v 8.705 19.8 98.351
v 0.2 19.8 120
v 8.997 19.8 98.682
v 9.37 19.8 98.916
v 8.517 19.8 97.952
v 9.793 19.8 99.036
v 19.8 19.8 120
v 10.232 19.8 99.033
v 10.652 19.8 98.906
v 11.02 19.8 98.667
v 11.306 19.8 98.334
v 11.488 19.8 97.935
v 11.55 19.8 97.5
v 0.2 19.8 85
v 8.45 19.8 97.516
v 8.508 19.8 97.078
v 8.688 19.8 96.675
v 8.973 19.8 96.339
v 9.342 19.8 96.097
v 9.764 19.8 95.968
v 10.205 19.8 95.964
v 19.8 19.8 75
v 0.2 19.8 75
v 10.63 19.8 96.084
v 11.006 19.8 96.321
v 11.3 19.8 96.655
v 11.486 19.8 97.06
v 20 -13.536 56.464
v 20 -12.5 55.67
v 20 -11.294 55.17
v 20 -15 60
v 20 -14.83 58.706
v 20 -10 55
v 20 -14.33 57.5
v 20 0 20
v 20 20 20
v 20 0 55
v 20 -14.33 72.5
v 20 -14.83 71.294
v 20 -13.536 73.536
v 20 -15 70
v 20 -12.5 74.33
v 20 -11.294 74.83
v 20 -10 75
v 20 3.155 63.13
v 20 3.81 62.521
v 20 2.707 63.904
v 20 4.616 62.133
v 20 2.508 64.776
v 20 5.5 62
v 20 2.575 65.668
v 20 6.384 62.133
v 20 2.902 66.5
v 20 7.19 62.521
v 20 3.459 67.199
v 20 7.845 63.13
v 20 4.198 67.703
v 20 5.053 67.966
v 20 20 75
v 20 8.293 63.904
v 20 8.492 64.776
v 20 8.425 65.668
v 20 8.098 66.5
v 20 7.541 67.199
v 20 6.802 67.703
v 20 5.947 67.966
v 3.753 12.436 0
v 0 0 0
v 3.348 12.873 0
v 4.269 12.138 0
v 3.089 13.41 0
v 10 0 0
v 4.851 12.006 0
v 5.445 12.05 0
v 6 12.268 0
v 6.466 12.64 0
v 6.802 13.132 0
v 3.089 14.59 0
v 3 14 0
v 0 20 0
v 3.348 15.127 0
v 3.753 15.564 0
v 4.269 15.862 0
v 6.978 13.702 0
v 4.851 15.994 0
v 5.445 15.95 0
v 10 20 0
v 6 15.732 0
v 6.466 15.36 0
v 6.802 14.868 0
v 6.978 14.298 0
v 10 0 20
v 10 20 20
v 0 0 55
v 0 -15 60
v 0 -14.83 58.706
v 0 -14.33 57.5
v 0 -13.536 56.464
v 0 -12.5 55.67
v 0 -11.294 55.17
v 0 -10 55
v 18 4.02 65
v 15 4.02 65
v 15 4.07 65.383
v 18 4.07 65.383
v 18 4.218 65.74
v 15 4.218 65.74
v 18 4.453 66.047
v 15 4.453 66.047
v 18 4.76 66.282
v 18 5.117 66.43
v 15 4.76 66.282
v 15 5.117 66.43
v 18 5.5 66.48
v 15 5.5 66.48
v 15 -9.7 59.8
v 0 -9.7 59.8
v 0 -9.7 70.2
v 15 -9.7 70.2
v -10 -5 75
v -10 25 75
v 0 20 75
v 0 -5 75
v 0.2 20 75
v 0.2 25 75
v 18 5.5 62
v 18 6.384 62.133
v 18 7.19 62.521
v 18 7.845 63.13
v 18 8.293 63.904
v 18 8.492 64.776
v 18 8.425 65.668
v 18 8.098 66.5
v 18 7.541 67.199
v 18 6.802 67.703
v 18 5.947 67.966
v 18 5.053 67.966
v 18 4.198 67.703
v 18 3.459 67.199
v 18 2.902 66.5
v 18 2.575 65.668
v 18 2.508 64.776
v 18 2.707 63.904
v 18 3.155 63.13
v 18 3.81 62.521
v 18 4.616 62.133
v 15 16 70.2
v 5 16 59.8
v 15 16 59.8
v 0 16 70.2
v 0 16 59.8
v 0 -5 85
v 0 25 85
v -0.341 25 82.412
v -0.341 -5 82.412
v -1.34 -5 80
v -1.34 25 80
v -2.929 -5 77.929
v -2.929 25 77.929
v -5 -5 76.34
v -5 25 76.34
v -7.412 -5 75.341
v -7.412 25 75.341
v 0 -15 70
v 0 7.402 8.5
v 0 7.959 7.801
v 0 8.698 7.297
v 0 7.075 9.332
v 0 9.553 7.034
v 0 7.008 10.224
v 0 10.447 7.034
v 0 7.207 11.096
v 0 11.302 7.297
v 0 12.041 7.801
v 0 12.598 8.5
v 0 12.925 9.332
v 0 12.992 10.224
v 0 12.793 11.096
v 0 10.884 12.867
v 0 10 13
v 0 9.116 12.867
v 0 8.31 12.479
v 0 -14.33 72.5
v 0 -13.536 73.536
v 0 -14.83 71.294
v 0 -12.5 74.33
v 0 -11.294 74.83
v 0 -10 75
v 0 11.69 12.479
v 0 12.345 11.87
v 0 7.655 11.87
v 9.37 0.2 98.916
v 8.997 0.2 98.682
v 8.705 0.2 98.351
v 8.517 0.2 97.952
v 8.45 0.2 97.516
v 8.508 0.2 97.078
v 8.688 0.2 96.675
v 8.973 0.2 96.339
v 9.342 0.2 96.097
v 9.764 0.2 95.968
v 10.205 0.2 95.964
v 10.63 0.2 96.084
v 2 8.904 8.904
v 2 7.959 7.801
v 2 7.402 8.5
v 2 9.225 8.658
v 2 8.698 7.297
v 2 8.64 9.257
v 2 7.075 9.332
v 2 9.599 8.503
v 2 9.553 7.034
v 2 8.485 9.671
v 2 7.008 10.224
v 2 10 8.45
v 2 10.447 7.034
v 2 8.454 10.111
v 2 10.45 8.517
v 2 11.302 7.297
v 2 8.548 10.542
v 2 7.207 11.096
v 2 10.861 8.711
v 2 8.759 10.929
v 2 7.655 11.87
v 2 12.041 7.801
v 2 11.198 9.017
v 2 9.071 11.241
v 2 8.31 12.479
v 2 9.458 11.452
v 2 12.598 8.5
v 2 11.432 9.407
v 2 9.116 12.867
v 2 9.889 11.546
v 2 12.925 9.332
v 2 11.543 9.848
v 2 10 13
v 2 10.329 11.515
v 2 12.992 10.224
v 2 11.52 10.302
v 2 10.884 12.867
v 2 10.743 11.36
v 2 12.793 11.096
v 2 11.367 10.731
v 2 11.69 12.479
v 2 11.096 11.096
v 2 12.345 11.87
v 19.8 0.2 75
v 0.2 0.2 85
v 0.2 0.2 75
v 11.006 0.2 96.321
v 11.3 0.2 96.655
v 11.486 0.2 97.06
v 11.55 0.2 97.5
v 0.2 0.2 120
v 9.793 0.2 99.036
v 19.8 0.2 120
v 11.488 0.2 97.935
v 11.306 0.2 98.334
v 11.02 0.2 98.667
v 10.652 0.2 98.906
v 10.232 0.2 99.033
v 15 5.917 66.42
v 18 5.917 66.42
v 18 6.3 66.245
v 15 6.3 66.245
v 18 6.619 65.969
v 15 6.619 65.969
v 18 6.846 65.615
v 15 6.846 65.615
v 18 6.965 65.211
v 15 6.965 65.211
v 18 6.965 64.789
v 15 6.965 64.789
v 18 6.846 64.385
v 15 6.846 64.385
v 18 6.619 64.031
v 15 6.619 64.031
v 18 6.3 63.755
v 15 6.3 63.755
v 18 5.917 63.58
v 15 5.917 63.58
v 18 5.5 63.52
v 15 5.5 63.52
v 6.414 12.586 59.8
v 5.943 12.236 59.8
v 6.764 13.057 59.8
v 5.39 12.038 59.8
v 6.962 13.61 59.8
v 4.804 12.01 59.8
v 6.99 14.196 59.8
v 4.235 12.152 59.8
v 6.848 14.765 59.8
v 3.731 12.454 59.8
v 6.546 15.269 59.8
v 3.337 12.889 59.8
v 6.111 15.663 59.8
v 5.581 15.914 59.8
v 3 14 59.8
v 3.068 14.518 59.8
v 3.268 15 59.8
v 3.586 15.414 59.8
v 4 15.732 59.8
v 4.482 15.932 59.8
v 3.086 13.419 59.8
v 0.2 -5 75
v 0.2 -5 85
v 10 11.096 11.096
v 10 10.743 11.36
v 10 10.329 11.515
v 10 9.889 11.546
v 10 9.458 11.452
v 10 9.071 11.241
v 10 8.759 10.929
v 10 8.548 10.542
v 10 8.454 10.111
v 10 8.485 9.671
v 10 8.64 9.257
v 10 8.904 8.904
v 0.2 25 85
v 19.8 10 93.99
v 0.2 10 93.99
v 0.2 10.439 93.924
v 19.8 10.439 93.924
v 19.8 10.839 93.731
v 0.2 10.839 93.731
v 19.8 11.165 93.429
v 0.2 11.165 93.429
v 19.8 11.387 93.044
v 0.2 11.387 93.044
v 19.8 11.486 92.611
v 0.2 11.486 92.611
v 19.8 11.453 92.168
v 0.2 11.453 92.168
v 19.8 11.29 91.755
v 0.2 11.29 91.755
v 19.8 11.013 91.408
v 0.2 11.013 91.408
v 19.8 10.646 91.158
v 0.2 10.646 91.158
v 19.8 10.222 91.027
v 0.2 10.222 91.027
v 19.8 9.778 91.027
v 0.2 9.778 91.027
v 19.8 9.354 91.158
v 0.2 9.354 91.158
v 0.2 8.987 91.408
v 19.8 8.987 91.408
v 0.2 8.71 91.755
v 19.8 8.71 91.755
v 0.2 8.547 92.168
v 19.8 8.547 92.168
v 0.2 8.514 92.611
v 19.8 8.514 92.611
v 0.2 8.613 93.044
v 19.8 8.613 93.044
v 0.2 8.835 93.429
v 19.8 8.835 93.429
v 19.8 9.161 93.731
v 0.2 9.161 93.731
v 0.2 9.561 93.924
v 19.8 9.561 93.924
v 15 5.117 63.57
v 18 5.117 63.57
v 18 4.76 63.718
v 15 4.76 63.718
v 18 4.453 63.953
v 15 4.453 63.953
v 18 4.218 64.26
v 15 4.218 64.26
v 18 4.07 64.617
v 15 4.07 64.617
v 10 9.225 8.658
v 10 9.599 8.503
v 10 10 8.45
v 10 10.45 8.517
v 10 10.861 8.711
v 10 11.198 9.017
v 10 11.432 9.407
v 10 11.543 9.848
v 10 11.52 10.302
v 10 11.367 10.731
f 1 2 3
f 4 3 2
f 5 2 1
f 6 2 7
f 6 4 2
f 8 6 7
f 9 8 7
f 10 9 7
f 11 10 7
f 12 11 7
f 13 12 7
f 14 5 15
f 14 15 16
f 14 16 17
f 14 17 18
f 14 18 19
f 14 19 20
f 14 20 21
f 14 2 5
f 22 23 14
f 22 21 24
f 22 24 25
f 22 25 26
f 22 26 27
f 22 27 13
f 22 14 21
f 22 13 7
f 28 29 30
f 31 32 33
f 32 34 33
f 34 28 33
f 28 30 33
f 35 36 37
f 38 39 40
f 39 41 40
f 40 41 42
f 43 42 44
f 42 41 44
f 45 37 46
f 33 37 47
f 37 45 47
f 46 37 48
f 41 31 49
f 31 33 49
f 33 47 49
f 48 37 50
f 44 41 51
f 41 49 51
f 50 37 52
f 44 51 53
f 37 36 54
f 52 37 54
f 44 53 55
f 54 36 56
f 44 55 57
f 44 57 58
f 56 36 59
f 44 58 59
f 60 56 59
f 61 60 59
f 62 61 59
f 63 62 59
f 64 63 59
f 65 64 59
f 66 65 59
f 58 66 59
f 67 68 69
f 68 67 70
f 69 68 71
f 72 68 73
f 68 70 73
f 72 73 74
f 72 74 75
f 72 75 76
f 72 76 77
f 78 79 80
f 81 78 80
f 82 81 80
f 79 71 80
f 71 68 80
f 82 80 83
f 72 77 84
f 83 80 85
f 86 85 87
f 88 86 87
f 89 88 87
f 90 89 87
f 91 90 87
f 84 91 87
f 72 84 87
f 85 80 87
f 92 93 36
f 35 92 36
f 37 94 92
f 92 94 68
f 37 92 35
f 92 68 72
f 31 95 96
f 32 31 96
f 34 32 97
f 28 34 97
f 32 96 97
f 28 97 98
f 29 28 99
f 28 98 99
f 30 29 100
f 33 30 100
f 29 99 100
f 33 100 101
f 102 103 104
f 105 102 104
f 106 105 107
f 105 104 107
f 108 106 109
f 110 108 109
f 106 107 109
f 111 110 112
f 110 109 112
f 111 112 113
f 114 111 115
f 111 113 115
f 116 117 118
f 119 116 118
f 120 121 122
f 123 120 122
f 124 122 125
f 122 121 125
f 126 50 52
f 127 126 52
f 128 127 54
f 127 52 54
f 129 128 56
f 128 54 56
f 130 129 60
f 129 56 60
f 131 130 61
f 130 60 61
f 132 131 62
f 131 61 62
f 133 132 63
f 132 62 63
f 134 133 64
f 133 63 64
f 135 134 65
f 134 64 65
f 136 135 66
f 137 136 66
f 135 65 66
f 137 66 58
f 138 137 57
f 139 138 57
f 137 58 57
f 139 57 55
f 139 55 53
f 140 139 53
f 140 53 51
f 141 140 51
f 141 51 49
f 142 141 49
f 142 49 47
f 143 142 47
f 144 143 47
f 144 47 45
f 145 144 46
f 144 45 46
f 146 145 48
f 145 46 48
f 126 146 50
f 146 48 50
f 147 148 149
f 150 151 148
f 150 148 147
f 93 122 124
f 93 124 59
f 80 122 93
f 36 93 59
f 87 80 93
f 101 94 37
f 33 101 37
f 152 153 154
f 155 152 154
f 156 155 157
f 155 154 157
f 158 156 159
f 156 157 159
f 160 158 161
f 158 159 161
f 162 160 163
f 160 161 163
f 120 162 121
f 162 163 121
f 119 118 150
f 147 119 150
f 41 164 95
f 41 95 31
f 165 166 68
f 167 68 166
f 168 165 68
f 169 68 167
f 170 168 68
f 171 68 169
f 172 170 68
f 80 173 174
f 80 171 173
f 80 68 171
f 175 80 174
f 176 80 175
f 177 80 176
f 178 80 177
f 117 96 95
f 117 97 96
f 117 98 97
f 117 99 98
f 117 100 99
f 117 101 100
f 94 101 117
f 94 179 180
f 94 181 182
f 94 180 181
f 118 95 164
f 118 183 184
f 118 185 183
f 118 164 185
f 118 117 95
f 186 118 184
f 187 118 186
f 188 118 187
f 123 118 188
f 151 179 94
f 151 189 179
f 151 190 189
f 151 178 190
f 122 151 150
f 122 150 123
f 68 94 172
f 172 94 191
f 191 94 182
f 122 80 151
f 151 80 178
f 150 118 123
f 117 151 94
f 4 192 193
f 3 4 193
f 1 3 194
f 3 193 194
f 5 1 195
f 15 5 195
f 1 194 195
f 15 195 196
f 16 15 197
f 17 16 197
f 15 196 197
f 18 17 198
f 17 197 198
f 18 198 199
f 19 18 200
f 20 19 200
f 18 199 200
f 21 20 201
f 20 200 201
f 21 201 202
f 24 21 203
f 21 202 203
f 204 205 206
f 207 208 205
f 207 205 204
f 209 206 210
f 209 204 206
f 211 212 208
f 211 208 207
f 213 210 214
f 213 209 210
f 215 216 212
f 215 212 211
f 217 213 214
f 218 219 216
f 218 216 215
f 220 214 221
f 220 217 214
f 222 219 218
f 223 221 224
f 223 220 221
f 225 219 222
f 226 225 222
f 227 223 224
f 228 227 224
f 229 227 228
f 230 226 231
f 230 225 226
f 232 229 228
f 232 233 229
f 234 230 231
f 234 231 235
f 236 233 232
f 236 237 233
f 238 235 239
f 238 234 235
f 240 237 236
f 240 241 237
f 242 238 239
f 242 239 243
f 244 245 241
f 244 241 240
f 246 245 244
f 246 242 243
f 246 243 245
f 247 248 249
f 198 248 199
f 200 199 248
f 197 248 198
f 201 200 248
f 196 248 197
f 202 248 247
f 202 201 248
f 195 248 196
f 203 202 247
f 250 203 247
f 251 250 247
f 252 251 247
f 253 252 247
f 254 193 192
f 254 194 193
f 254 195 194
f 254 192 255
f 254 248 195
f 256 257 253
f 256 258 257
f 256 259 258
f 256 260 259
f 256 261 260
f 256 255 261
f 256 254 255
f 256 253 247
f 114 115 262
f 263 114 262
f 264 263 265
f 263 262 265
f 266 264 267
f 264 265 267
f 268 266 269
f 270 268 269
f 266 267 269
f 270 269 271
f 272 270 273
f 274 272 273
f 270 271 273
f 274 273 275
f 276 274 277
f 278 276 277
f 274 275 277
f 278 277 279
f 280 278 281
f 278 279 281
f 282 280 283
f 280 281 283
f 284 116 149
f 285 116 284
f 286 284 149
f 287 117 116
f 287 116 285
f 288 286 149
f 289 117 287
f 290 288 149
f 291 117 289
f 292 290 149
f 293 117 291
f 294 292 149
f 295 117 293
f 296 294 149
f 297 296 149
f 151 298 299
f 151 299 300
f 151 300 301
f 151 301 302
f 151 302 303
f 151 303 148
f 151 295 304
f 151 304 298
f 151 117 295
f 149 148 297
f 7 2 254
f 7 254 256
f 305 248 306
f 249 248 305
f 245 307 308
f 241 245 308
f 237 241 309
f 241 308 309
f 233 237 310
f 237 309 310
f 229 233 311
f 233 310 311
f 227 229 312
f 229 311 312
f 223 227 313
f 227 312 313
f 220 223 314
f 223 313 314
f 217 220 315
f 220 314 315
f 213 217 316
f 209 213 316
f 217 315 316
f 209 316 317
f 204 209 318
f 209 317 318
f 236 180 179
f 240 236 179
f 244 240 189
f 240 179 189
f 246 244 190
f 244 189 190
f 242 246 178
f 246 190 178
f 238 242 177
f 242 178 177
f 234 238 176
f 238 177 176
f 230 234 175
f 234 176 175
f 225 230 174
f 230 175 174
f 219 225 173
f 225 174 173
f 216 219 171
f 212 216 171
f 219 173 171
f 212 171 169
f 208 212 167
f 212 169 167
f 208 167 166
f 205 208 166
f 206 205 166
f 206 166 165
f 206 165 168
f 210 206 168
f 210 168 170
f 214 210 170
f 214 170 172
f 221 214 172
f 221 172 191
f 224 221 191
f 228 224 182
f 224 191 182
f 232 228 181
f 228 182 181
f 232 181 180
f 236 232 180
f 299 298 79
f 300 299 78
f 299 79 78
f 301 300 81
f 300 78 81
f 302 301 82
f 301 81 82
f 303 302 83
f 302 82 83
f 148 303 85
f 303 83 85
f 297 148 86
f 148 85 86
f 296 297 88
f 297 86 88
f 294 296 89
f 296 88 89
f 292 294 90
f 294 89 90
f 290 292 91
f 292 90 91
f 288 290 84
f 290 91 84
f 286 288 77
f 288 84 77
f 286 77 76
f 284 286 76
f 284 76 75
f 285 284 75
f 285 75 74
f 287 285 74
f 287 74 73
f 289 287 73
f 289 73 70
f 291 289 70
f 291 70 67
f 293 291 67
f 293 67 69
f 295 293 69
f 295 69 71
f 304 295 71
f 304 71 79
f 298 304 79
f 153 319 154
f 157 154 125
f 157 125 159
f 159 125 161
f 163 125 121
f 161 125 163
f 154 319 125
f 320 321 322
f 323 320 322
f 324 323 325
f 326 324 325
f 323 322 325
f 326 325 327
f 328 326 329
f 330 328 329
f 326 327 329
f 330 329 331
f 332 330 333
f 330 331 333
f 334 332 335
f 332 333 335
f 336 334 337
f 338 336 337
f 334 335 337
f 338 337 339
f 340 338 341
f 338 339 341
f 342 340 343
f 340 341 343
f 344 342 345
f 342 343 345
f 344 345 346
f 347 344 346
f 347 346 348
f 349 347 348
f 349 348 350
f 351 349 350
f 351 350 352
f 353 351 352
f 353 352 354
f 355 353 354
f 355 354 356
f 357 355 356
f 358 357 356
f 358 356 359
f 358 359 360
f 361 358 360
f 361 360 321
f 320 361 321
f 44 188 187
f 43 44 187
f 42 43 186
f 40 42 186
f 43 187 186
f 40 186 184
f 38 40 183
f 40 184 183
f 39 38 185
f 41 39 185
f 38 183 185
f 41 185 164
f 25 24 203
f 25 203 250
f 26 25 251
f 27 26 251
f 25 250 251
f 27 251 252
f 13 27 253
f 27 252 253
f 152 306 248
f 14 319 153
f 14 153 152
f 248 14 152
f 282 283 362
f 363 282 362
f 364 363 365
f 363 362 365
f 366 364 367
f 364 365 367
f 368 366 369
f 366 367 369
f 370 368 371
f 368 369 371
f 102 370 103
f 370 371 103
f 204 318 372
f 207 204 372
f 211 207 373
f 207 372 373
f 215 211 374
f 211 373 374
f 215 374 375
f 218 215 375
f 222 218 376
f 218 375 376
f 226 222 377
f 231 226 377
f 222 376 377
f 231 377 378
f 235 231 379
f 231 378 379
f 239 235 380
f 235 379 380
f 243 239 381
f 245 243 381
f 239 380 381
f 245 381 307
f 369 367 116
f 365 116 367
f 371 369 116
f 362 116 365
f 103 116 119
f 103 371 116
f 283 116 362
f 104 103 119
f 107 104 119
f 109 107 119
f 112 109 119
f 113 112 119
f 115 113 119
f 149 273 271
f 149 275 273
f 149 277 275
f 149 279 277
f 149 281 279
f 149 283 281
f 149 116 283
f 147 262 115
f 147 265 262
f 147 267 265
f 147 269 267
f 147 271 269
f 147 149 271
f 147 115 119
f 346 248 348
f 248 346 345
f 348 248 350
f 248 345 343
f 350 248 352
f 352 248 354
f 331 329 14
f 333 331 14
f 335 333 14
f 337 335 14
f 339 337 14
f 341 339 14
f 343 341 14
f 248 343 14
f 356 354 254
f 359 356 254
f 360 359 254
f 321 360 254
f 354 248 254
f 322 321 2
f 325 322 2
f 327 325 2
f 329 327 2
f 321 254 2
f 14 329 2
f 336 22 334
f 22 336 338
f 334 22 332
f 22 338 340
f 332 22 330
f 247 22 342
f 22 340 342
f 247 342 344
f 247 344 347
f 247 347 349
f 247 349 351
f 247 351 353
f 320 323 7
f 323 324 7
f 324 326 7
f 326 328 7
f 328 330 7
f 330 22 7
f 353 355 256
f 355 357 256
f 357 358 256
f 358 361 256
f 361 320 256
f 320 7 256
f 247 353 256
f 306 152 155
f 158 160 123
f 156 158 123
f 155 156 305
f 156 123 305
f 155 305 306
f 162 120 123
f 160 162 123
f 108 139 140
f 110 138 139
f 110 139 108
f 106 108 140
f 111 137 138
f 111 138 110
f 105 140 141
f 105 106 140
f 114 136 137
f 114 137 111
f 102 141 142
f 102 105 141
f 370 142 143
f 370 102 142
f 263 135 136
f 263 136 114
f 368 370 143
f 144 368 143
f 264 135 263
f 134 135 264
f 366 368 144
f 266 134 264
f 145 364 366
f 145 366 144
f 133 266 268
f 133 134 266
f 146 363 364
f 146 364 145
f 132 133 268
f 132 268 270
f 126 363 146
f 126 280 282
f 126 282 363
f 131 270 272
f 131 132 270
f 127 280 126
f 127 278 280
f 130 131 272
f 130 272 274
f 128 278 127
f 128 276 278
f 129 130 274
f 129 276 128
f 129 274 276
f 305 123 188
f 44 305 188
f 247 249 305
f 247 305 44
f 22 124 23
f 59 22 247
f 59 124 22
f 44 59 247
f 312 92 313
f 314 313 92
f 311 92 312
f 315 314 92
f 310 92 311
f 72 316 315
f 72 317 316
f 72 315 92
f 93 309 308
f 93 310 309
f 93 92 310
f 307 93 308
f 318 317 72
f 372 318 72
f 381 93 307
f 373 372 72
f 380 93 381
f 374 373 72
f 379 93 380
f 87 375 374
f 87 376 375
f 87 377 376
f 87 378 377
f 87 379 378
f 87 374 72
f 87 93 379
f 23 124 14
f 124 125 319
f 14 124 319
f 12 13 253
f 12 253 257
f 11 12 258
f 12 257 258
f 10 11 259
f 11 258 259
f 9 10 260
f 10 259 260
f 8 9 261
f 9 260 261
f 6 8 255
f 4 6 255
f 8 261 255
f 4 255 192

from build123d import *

# Parameters (mm, degrees)
SKETCH_1_W           = 20
SKETCH_1_H           = 20
EXTRUDE_1_DEPTH      = 120
SKETCH_2_W           = 10
SKETCH_2_H           = 20
CUT_EXTRUDE_1_DEPTH  = 120
CUT_EXTRUDE_2_DEPTH  = 120
SKETCH_4_R           = 3
CUT_EXTRUDE_3_DEPTH  = 2
SKETCH_6_R           = 1.49
CUT_EXTRUDE_4_DEPTH  = 20
CUT_EXTRUDE_5_DEPTH  = 20
SKETCH_8_W           = 19.6
SKETCH_8_H           = 0.2
SKETCH_8_W_2         = 0.2
SKETCH_8_H_2         = 19.6
CUT_EXTRUDE_6_DEPTH  = 45
EXTRUDE_2_DEPTH      = 24.8
EXTRUDE_START        = 5.2
EXTRUDE_3_DEPTH      = 5.2
SKETCH_12_W          = 20
SKETCH_12_H          = 20
EXTRUDE_4_DEPTH      = 15
SKETCH_13_W          = 5
SKETCH_13_H          = 5
SKETCH_13_H_2        = 4.5
CUT_EXTRUDE_8_DEPTH  = 15
SKETCH_14_R          = 2
CUT_EXTRUDE_9_DEPTH  = 70
SKETCH_15_W          = 10
SKETCH_15_H          = 5.5
CUT_EXTRUDE_10_DEPTH = 15
CUT_EXTRUDE_11_DEPTH = 5
CUT_EXTRUDE_12_DEPTH = 20
SKETCH_18_R          = 3
CUT_EXTRUDE_13_DEPTH = 2
SKETCH_19_W          = 0.2
SKETCH_19_H          = 25.5
CUT_EXTRUDE_14_DEPTH = 15
SKETCH_21_W          = 10.4
SKETCH_21_H          = 0.2
CUT_EXTRUDE_15_DEPTH = 15


with BuildPart() as part:
    # 草图1 → 凸台-拉伸1 (new body)
    with BuildSketch(Plane.XY):
        with Locations((10, 10)):
            Rectangle(SKETCH_1_W, SKETCH_1_H)
    extrude(amount=EXTRUDE_1_DEPTH)

    # 草图2 → 切除-拉伸1 (cut)
    with BuildSketch(Plane(origin=(0, 20, 0), x_dir=(1, 0, 0), z_dir=(0, 1, 0))):
        with Locations((15, -10)):
            Rectangle(SKETCH_2_W, SKETCH_2_H)
    extrude(amount=-CUT_EXTRUDE_1_DEPTH, mode=Mode.SUBTRACT)

    # 草图3 → 切除-拉伸2 (cut)
    with BuildSketch(Plane(origin=(10, 0, 0), x_dir=(0, 0, -1), z_dir=(1, 0, 0))):
        with BuildLine():
            ThreePointArc((-8.45, 10), (-9.40684068, 11.432013275), (-11.096015511, 11.096015511))
            Line((-11.096015511, 11.096015511), (-8.903984489, 8.903984489))
            ThreePointArc((-8.903984489, 8.903984489), (-8.567986725, 9.40684068), (-8.45, 10))
        make_face()
        with BuildLine():
            Line((-8.903984489, 8.903984489), (-11.096015511, 11.096015511))
            ThreePointArc((-11.096015511, 11.096015511), (-11.096015511, 8.903984489), (-8.903984489, 8.903984489))
        make_face()
    extrude(amount=-CUT_EXTRUDE_2_DEPTH, mode=Mode.SUBTRACT)

    # 草图4 → 切除-拉伸3 (cut)
    with BuildSketch(Plane.ZY):
        with Locations((10, 10)):
            Circle(SKETCH_4_R)
    extrude(amount=-CUT_EXTRUDE_3_DEPTH, mode=Mode.SUBTRACT)

    # 草图6 → 切除-拉伸4 (cut)
    with BuildSketch(Plane.ZY):
        with Locations((92.5, 10)):
            Circle(SKETCH_6_R)
    extrude(amount=-CUT_EXTRUDE_4_DEPTH, mode=Mode.SUBTRACT)

    # 草图7 → 切除-拉伸5 (cut)
    with BuildSketch(Plane.XZ):
        with BuildLine():
            ThreePointArc((11.55, 97.5), (10.844615988, 98.799662969), (9.370485378, 98.9164079))
            Line((9.370485378, 98.9164079), (10.629514622, 96.0835921))
            ThreePointArc((10.629514622, 96.0835921), (11.299662969, 96.655384012), (11.55, 97.5))
        make_face()
        with BuildLine():
            Line((10.629514622, 96.0835921), (9.370485378, 98.9164079))
            ThreePointArc((9.370485378, 98.9164079), (8.5835921, 96.870485378), (10.629514622, 96.0835921))
        make_face()
    extrude(amount=-CUT_EXTRUDE_5_DEPTH, mode=Mode.SUBTRACT)

    # 草图8 → 切除-拉伸6 (cut)
    with BuildSketch(Plane.XY.offset(120)):
        with Locations((10, 19.9)):
            Rectangle(SKETCH_8_W, SKETCH_8_H)
        with Locations((0.1, 19.9)):
            Rectangle(SKETCH_8_W_2, SKETCH_8_H)
        with Locations((0.1, 10)):
            Rectangle(SKETCH_8_W_2, SKETCH_8_H_2)
        with Locations((19.9, 10)):
            Rectangle(SKETCH_8_W_2, SKETCH_8_H_2)
        with Locations((19.9, 0.1)):
            Rectangle(SKETCH_8_W_2, SKETCH_8_H)
        with Locations((10, 0.1)):
            Rectangle(SKETCH_8_W, SKETCH_8_H)
        with Locations((0.1, 0.1)):
            Rectangle(SKETCH_8_W_2, SKETCH_8_H)
        with Locations((19.9, 19.9)):
            Rectangle(SKETCH_8_W_2, SKETCH_8_H)
    extrude(amount=-CUT_EXTRUDE_6_DEPTH, mode=Mode.SUBTRACT)

    # 草图9 → 凸台-拉伸2 (add)
    with BuildSketch(Plane(origin=(0, 19.8, 0), x_dir=(1, 0, 0), z_dir=(0, 1, 0))):
        with BuildLine():
            Line((0, -75), (-10, -75))
            ThreePointArc((-10, -75), (-2.928932188, -77.928932188), (0, -85))
            Line((0, -85), (0.2, -85))
            Line((0.2, -85), (0.2, -75))
            Line((0.2, -75), (0, -75))
        make_face()
    extrude(amount=-EXTRUDE_2_DEPTH)

    # 草图10 → 凸台-拉伸3 (add)
    with BuildSketch(Plane(origin=(0, 19.8, 0), x_dir=(1, 0, 0), z_dir=(0, 1, 0)).offset(EXTRUDE_START)):
        with BuildLine():
            Line((-10, -75), (0, -75))
            Line((0, -75), (0.2, -75))
            Line((0.2, -75), (0.2, -85))
            Line((0.2, -85), (0, -85))
            ThreePointArc((0, -85), (-2.928932188, -77.928932188), (-10, -75))
        make_face()
    extrude(amount=-EXTRUDE_3_DEPTH)

    # 草图12 → 凸台-拉伸4 (add)
    with BuildSketch(Plane.XZ):
        with Locations((10, 65)):
            Rectangle(SKETCH_12_W, SKETCH_12_H)
    extrude(amount=EXTRUDE_4_DEPTH)

    # 草图13 → 切除-拉伸8 (cut)
    with BuildSketch(Plane.ZY):
        Polygon((60, 10.5), (60, 0), (65, 0), (70, 0), (70, 10.5), align=None)
        with Locations((62.5, -2.5)):
            Rectangle(SKETCH_13_W, SKETCH_13_H)
        with Locations((67.5, -2.5)):
            Rectangle(SKETCH_13_W, SKETCH_13_H)
        with Locations((62.5, -7.25)):
            Rectangle(SKETCH_13_W, SKETCH_13_H_2)
        with Locations((67.5, -7.25)):
            Rectangle(SKETCH_13_W, SKETCH_13_H_2)
    extrude(amount=-CUT_EXTRUDE_8_DEPTH, mode=Mode.SUBTRACT)

    # 草图14 → 切除-拉伸9 (cut)
    with BuildSketch(Plane(origin=(0, 0, 0), x_dir=(-1, 0, 0), z_dir=(0, 0, -1))):
        with Locations((-5, 14)):
            Circle(SKETCH_14_R)
    extrude(amount=-CUT_EXTRUDE_9_DEPTH, mode=Mode.SUBTRACT)

    # 草图15 → 切除-拉伸10 (cut)
    with BuildSketch(Plane.ZY):
        with Locations((65, 13.25)):
            Rectangle(SKETCH_15_W, SKETCH_15_H)
    extrude(amount=-CUT_EXTRUDE_10_DEPTH, mode=Mode.SUBTRACT)

    # 草图16 → 切除-拉伸11 (cut)
    with BuildSketch(Plane.ZY.offset(-15)):
        with BuildLine():
            ThreePointArc((66.48, 5.5), (65, 6.98), (63.52, 5.5))
            Line((63.52, 5.5), (65, 5.5))
            Line((65, 5.5), (65, 4.02))
            ThreePointArc((65, 4.02), (66.046518036, 4.453481964), (66.48, 5.5))
        make_face()
        with BuildLine():
            Line((65, 5.5), (63.52, 5.5))
            ThreePointArc((63.52, 5.5), (63.953481964, 4.453481964), (65, 4.02))
            Line((65, 4.02), (65, 5.5))
        make_face()
    extrude(amount=-CUT_EXTRUDE_11_DEPTH, mode=Mode.SUBTRACT)

    # 草图17 → 切除-拉伸12 (cut)
    with BuildSketch(Plane.ZY):
        with BuildLine():
            Line((55, -10), (55, -15))
            Line((55, -15), (60, -15))
            ThreePointArc((60, -15), (56.464466094, -13.535533906), (55, -10))
        make_face()
        with BuildLine():
            ThreePointArc((75, -10), (73.535533906, -13.535533906), (70, -15))
            Line((70, -15), (75, -15))
            Line((75, -15), (75, -10))
        make_face()
    extrude(amount=-CUT_EXTRUDE_12_DEPTH, mode=Mode.SUBTRACT)

    # 草图18 → 切除-拉伸13 (cut)
    with BuildSketch(Plane(origin=(20, 0, 0), x_dir=(0, 0, -1), z_dir=(1, 0, 0))):
        with Locations((-65, 5.5)):
            Circle(SKETCH_18_R)
    extrude(amount=-CUT_EXTRUDE_13_DEPTH, mode=Mode.SUBTRACT)

    # 草图19 → 切除-拉伸14 (cut)
    with BuildSketch(Plane.ZY):
        with Locations((70.1, 3.25)):
            Rectangle(SKETCH_19_W, SKETCH_19_H)
        with Locations((59.9, 3.25)):
            Rectangle(SKETCH_19_W, SKETCH_19_H)
    extrude(amount=-CUT_EXTRUDE_14_DEPTH, mode=Mode.SUBTRACT)

    # 草图21 → 切除-拉伸15 (cut)
    with BuildSketch(Plane.ZY):
        with Locations((65, -9.6)):
            Rectangle(SKETCH_21_W, SKETCH_21_H)
    extrude(amount=-CUT_EXTRUDE_15_DEPTH, mode=Mode.SUBTRACT)


solid = part.part
